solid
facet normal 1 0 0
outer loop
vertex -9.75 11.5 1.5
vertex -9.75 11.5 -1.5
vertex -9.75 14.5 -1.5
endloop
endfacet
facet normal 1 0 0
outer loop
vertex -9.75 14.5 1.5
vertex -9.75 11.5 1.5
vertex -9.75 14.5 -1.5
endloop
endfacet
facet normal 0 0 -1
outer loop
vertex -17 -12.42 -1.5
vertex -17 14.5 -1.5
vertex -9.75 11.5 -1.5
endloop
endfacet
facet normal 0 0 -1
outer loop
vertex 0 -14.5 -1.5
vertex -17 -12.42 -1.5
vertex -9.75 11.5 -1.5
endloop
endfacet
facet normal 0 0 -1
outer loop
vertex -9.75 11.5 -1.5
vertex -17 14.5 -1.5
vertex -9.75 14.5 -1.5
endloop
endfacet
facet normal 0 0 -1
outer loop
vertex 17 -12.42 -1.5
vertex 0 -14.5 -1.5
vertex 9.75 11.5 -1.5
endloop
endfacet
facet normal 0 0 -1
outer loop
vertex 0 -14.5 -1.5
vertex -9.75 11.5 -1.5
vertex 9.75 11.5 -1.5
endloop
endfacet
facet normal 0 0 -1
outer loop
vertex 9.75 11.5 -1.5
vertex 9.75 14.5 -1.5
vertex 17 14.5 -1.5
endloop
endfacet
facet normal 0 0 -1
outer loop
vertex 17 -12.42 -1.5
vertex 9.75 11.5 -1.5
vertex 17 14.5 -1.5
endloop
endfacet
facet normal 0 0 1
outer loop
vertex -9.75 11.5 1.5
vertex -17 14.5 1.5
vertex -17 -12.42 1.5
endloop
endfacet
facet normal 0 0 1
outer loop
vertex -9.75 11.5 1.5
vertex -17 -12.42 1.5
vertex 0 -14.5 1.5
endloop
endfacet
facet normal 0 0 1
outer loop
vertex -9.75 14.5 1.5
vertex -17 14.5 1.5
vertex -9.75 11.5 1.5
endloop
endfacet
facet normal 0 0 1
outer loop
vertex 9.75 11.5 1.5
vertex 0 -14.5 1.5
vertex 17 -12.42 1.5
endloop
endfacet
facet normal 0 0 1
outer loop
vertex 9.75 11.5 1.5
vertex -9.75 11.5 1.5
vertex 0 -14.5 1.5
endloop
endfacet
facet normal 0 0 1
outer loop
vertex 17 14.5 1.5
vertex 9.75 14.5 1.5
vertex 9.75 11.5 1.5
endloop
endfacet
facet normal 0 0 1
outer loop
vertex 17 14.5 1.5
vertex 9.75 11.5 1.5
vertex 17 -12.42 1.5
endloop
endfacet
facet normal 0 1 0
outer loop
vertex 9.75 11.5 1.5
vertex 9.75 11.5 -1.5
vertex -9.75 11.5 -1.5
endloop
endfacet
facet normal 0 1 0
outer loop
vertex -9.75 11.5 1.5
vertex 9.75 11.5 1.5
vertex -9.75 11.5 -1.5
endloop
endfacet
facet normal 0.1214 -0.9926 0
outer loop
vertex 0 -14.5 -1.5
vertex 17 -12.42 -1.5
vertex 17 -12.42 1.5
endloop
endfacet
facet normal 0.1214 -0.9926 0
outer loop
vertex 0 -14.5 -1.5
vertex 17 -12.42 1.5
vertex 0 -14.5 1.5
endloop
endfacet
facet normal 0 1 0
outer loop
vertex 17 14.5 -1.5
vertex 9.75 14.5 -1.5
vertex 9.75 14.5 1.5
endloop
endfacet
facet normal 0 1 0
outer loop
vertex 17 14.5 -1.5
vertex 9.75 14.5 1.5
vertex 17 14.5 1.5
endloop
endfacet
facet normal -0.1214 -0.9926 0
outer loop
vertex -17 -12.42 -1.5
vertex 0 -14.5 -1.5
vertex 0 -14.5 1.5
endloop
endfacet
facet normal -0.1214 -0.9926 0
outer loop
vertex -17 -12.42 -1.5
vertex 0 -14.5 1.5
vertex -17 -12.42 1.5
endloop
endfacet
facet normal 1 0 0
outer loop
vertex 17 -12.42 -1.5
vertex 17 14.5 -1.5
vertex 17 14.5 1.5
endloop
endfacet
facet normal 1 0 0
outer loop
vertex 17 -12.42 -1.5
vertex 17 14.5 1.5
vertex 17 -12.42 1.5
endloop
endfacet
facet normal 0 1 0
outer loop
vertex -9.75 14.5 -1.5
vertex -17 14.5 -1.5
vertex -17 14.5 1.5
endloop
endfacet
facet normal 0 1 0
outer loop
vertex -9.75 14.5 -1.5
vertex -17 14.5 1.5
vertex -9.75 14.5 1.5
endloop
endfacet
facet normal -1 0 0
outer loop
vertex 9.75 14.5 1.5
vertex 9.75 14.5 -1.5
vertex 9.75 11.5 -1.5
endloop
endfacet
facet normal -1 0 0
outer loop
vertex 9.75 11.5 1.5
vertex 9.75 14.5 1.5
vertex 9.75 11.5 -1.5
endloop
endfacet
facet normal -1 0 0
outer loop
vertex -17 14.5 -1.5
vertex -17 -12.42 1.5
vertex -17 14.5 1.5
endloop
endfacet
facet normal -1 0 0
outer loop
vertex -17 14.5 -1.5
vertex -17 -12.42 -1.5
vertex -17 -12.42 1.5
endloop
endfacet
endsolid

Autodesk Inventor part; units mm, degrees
ref_plane "YZ Plane" through (0, 0, 0) normal (1, 0, 0) x (0, 1, 0)
ref_plane "XZ Plane" through (0, 0, 0) normal (0, 1, 0) x (-1, 0, 0)
ref_plane "XY Plane" through (0, 0, 0) normal (0, 0, 1) x (1, 0, 0)
sketch "Sketch1" plane through (0, 0, 0) normal (0, 0, 1) x (1, 0, 0)
  line L0 (-17, 14.5) -> (17, 14.5)
  line L1 (17, 14.5) -> (17, -14.5)
  line L2 (17, -14.5) -> (-17, -14.5)
  line L3 (-17, -14.5) -> (-17, 14.5)
  line L4 (-9.75, 14.5) -> (9.75, 14.5)
  line L5 (9.75, 14.5) -> (9.75, 11.5)
  line L6 (9.75, 11.5) -> (-9.75, 11.5)
  line L7 (-9.75, 11.5) -> (-9.75, 14.5)
  line L8 (0, -14.5) -> (0, -12.42)
  line L9 (17, -12.42) -> (0, -14.5)
  line L10 (0, -14.5) -> (-17, -12.42)
  point P0 (0, 0)
  point P1 (17, 0)
  point P2 (0, 14.5)
  point P3 (9.75, 14.5)
  dimension "d0" = 34
  dimension "d1" = 29
  dimension "d3" = 2.08
  dimension "d6" = 19.5
  dimension "d7" = 3
extrude "Extrusion1" add sketch "Sketch1" along normal mid plane 3 contours L0 L7 L6 L5 L1 L9 L10 L3
properties part number "A"
